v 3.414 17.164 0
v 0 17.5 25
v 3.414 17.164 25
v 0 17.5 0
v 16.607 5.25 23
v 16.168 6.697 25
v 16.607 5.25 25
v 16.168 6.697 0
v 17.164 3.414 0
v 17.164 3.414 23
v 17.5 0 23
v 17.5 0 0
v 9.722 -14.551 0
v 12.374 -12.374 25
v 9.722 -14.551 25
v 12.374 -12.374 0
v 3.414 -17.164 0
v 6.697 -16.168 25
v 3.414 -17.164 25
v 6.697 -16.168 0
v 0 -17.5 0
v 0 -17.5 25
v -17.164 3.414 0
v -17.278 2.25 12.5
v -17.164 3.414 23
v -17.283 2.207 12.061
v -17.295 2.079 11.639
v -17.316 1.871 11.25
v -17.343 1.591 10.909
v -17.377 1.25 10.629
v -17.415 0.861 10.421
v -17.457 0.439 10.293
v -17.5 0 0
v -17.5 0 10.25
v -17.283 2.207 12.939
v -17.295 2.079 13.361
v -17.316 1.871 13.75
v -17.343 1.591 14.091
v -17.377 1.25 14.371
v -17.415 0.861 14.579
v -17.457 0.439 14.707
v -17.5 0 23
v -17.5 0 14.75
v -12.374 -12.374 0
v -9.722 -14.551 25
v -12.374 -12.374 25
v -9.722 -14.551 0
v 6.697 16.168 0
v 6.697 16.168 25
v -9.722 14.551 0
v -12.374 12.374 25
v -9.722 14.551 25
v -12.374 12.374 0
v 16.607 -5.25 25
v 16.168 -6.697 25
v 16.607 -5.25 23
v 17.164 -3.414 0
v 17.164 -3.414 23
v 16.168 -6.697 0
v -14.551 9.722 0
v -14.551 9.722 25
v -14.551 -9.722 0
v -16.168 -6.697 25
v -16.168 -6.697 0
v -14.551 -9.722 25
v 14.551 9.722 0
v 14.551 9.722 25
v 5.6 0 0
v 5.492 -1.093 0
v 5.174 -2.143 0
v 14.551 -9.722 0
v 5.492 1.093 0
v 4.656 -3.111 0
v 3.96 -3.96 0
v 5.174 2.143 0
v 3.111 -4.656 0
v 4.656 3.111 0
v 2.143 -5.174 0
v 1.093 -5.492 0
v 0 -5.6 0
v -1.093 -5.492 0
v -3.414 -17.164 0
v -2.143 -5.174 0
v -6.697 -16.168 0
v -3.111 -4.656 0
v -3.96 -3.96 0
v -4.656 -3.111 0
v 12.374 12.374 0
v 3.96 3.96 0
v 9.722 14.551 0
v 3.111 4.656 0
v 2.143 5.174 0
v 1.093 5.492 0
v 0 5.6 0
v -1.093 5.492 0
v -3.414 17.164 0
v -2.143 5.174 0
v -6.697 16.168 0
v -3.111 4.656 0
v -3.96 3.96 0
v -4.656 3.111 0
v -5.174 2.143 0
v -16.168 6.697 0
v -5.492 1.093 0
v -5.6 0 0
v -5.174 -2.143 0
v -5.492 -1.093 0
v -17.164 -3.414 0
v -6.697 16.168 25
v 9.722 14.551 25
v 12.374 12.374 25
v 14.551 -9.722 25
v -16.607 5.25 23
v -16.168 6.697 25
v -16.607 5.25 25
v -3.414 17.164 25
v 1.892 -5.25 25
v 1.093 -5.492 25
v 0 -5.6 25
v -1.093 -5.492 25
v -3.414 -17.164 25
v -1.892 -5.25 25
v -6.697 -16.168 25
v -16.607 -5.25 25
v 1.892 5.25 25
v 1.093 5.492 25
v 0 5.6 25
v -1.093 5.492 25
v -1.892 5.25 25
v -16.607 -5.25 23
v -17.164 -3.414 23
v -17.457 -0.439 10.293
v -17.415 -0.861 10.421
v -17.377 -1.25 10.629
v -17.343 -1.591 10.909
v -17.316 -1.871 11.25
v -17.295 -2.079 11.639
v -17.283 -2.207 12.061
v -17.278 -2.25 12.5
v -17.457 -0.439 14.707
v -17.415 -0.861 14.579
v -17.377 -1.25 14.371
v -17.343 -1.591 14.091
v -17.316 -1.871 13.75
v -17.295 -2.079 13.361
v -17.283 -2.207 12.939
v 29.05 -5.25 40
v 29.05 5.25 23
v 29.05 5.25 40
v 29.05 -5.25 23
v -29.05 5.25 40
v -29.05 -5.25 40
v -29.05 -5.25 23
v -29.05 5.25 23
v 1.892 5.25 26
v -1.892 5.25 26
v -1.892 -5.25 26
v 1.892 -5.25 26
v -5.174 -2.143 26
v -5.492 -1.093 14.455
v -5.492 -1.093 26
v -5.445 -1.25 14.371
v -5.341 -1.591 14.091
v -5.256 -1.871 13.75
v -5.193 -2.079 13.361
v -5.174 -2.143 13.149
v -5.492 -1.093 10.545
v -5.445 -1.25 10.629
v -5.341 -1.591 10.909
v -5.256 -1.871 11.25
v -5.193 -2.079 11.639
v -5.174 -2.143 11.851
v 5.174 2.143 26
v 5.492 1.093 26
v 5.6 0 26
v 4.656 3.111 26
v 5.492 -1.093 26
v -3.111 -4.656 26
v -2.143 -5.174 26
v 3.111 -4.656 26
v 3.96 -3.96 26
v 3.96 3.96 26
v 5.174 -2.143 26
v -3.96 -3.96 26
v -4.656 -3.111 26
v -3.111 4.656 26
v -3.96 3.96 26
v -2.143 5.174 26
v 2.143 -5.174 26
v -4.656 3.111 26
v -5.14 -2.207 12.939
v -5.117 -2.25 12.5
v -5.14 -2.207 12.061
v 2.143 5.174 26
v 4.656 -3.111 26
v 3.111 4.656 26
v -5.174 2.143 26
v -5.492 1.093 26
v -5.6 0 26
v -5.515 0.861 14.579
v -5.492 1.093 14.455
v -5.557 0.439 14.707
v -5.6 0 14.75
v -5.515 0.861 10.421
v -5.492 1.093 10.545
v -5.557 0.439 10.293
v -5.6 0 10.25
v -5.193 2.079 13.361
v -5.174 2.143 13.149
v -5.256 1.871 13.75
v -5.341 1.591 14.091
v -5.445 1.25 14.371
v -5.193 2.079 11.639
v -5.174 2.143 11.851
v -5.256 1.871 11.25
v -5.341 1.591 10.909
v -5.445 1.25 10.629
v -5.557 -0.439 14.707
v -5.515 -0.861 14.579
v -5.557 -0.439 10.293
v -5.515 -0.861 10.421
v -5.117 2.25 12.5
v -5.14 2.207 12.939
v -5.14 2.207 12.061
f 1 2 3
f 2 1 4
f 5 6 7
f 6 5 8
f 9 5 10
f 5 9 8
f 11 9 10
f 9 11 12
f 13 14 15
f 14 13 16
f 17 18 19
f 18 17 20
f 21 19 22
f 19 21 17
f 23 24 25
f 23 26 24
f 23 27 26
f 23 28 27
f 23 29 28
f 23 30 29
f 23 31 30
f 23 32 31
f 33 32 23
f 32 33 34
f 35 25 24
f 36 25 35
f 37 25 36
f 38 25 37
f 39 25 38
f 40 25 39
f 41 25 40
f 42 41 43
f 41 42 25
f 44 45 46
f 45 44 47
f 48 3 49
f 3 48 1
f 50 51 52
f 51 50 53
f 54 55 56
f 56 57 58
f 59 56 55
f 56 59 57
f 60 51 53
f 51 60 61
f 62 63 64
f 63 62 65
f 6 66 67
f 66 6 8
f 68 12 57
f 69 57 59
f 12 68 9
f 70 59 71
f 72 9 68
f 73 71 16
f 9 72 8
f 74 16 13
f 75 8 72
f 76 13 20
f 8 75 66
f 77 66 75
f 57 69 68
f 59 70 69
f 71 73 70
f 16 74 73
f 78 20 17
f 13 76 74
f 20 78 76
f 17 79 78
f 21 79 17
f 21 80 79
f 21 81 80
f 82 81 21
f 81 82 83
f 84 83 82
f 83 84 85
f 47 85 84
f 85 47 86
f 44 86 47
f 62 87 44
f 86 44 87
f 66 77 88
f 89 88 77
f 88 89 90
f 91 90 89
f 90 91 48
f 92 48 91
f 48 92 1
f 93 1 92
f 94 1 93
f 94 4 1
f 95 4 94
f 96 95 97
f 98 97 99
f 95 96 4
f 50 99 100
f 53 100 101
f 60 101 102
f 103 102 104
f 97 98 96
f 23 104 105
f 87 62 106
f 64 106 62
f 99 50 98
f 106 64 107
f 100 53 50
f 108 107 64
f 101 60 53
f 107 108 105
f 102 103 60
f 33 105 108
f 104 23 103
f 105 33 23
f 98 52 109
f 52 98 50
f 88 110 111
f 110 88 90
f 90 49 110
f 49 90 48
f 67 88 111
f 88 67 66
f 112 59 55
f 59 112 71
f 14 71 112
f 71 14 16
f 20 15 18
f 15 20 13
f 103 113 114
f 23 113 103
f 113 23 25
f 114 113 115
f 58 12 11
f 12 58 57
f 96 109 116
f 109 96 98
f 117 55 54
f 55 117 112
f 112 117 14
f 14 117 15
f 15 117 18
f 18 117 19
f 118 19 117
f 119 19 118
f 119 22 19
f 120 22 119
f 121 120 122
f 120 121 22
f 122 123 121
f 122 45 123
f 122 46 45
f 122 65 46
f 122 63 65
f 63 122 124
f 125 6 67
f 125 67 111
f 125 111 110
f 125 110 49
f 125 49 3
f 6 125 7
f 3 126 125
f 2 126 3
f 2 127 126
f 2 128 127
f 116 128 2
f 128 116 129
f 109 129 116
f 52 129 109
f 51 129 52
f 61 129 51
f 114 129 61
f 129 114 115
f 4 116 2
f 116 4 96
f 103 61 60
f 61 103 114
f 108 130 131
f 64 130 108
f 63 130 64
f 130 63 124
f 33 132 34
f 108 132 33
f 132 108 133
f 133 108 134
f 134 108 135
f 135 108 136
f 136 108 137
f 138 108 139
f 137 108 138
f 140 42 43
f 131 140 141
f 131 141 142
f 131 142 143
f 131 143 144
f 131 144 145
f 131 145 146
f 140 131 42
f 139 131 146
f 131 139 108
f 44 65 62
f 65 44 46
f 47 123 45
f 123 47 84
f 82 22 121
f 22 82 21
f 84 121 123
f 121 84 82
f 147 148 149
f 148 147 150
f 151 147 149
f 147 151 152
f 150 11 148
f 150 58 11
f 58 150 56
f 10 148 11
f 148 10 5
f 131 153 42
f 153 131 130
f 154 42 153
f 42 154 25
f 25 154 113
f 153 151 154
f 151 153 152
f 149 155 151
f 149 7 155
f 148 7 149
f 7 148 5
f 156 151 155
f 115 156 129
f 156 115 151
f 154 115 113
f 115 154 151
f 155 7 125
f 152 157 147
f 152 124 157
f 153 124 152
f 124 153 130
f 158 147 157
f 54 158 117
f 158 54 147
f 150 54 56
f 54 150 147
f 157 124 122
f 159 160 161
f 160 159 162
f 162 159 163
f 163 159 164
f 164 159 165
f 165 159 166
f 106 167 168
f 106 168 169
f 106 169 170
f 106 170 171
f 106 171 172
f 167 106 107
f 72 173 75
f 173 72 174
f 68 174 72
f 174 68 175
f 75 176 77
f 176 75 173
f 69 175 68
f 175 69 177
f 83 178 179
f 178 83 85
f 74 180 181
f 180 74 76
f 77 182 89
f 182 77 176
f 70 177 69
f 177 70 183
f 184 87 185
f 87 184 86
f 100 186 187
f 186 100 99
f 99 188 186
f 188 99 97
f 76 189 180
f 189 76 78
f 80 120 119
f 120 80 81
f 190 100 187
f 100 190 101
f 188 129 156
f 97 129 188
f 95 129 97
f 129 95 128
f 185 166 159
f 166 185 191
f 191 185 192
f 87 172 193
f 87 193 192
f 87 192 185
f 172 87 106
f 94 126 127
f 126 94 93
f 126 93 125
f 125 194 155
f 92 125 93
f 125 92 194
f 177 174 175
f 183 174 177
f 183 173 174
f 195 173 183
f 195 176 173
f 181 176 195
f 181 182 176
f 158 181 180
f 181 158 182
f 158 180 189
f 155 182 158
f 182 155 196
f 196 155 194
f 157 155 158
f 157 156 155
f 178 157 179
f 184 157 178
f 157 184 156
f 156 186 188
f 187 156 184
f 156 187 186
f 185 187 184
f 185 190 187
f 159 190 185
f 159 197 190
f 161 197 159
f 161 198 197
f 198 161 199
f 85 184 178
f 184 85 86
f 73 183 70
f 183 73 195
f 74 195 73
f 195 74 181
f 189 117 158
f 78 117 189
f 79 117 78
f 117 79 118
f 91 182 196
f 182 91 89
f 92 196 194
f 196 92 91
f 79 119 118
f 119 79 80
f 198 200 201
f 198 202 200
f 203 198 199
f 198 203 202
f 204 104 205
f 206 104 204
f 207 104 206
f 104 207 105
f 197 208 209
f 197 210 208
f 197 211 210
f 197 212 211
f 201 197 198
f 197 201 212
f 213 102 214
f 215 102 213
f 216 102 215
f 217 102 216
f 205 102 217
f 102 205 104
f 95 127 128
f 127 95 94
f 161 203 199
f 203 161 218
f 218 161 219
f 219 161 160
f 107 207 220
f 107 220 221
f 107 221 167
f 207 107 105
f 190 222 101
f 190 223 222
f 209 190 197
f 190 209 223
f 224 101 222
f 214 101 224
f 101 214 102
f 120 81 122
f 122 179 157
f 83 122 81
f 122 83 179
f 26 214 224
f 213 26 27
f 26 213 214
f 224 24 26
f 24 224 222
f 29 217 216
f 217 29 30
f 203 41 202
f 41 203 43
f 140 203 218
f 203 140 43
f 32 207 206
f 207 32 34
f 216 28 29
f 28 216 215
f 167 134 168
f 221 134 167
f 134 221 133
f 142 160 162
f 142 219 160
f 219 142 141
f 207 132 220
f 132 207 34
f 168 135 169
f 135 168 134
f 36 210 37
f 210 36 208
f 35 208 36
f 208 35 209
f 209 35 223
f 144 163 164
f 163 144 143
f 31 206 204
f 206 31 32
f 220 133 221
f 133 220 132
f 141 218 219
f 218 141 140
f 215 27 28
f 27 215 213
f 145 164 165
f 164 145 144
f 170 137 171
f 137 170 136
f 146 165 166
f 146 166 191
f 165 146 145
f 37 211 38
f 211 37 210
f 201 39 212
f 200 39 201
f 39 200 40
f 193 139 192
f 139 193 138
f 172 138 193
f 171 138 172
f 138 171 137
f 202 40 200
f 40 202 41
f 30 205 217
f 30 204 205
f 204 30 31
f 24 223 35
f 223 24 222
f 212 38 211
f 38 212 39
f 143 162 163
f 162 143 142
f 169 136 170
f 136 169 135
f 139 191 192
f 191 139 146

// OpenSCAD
$fn = 32;

// ----------------------------------------------------------------------
// Hand knob: 35 x 58.1 x 25 mm
// ----------------------------------------------------------------------

// --- parameters (mm) ---
grip_d = 35;              // knob diameter
grip_h = 25;              // knob height
shaft_d = 11.2;           // shaft bore
set_d = 4.5;              // set screw tap hole
wing_l = 58.1;            // wing span
wing_w = 10.5;            // wing width
wing_h = 15;              // wing thickness

module body() {
  cylinder(h = grip_h, d = grip_d);
}

module wing() {
  /* wing sunk 2 mm into the knob so the joint overlaps */
  translate([-wing_l / 2, -wing_w / 2, grip_h - 2])
    cube([wing_l, wing_w, wing_h + 2]);
}

difference() {
  union() {
    body();
    wing();
  }
  translate([0, 0, -1]) cylinder(h = grip_h + 0 + 2, d = shaft_d);
  translate([-grip_d / 2 - 1, 0, grip_h * 0.5]) rotate([0, 90, 0]) cylinder(h = grip_d / 2 + 2, d = set_d);
}
